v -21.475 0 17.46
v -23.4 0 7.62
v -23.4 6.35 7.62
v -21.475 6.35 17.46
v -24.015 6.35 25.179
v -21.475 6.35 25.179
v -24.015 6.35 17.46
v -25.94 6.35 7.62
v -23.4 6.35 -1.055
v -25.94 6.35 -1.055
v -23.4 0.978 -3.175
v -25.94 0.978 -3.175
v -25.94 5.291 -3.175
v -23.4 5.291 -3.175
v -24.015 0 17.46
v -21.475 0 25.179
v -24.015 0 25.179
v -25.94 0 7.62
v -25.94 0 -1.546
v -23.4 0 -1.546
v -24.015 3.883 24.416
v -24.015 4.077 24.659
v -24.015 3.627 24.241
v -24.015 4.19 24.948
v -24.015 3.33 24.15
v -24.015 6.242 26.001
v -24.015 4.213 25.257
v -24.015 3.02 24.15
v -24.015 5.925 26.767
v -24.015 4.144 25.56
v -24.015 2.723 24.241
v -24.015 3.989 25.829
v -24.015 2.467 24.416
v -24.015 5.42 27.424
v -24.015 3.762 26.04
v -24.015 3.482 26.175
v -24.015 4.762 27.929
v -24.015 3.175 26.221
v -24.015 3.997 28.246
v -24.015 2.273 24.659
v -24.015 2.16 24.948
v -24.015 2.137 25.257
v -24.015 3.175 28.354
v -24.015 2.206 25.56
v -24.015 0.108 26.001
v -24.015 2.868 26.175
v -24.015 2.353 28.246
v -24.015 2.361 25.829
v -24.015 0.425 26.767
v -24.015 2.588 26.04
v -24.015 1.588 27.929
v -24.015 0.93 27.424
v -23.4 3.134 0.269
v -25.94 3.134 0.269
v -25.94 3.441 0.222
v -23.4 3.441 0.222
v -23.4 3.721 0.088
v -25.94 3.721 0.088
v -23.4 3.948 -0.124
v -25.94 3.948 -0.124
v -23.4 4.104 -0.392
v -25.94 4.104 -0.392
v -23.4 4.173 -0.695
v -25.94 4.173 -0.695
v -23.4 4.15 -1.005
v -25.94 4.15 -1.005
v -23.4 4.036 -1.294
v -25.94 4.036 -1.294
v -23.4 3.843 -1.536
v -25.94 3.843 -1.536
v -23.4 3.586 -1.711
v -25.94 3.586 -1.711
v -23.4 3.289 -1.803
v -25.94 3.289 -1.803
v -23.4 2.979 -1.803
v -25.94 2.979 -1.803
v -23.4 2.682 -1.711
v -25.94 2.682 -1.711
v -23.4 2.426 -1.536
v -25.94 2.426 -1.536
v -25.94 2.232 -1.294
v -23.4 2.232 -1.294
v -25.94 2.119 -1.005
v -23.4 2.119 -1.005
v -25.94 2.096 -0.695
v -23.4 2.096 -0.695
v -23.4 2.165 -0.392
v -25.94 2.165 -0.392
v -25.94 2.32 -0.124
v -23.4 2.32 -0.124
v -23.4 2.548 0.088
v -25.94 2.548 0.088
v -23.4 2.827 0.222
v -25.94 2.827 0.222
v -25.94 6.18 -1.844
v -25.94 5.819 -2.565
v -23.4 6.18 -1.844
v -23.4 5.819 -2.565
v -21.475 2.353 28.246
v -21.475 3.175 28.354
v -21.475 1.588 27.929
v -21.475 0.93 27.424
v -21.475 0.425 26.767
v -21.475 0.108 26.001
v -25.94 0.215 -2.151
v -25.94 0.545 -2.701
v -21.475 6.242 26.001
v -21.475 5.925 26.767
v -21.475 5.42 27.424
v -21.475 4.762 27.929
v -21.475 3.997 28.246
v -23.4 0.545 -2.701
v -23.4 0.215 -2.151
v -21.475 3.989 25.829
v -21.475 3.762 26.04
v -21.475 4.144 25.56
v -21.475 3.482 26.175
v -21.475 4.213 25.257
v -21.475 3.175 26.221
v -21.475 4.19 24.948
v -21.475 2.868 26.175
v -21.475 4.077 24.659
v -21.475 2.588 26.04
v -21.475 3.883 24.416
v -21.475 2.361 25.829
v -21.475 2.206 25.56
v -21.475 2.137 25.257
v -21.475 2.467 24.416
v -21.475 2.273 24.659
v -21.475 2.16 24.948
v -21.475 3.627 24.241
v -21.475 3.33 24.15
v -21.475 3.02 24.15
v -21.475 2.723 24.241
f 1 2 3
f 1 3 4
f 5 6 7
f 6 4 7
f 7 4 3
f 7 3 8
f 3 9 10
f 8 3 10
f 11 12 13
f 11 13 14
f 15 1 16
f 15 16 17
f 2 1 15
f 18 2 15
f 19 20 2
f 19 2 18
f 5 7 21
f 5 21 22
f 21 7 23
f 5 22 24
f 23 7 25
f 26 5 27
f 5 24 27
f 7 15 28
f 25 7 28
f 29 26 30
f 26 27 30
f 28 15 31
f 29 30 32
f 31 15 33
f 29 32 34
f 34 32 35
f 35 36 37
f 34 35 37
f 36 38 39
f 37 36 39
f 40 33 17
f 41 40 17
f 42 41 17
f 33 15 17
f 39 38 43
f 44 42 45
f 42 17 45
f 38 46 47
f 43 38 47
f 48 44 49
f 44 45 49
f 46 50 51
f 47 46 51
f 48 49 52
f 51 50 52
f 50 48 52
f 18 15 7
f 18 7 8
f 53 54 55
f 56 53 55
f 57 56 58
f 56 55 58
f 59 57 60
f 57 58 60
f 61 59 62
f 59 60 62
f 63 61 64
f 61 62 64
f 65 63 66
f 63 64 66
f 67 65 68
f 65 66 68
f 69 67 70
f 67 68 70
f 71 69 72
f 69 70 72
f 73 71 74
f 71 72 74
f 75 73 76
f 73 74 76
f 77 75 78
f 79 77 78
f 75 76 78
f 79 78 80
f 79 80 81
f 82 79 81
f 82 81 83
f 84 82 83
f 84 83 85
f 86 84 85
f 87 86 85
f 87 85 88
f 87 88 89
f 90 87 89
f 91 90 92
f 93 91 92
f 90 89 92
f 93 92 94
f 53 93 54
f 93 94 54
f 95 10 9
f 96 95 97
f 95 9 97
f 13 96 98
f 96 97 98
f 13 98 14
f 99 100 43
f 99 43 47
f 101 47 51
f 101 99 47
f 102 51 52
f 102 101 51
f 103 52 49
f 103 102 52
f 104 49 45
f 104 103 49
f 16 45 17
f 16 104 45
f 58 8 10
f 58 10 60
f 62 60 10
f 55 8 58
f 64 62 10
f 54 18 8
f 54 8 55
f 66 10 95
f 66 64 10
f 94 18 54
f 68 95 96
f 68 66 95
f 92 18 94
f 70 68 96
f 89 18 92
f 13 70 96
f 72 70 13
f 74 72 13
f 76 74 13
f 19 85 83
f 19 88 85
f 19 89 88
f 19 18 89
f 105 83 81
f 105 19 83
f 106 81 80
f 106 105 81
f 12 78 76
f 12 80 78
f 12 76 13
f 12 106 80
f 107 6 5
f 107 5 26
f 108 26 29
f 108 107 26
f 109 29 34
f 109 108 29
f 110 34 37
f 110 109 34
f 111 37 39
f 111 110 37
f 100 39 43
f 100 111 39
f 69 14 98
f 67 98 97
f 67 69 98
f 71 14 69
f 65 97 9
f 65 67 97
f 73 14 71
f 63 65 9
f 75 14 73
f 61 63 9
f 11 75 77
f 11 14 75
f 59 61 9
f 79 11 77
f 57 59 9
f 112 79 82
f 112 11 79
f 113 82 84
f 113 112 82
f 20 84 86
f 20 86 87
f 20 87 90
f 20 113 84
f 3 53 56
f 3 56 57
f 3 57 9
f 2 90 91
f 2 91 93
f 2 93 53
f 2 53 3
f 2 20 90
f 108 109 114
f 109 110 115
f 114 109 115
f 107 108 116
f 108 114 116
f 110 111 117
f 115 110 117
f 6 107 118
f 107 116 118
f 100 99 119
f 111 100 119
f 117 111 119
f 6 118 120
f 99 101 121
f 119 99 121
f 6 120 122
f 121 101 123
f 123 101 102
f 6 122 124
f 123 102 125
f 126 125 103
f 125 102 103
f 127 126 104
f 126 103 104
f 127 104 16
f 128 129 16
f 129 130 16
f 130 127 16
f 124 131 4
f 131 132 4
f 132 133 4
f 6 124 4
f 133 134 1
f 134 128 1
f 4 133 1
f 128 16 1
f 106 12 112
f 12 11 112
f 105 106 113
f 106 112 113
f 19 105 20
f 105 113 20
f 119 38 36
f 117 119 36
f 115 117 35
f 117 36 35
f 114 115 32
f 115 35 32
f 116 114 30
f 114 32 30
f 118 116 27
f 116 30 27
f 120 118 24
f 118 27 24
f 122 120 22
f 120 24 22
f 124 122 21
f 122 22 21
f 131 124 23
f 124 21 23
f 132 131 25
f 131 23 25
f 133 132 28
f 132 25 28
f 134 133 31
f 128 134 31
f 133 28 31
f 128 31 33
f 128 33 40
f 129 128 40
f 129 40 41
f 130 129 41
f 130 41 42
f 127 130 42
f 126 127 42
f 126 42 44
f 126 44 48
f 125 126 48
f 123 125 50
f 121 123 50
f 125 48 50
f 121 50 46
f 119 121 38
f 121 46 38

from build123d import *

# Parameters (mm, degrees)
BOSS_EXTRUDE1_DEPTH     = 6.35
CUT_EXTRUDE1_DEPTH      = 30.397829873
CUT_EXTRUDE1_DEPTH_BACK = 3.556
CUT_EXTRUDE2_START      = -2.54
CUT_EXTRUDE2_DEPTH      = 2.54
SKETCH4_3_R             = 1.0414
CUT_EXTRUDE3_DEPTH      = 2.54
SKETCH3_3_R             = 1.0414
CUT_EXTRUDE4_DEPTH      = 2.54


# Read off the part's stored shape, not the designer's step: Cut-Extrude2
with BuildPart() as part:
    # Sketch1 → Boss-Extrude1 (new body)
    with BuildSketch(Plane(origin=(0, 0, 0), x_dir=(1, 0, 0), z_dir=(0, 1, 0))):
        Polygon((-24.015298923, -26.283339213), (-24.015298923, -25.179419289), (-24.015298923, -17.460268456), (-25.940364211, -7.62), (-25.940364211, 3.175), (-23.400364211, 3.175), (-23.400364211, -7.62), (-21.475298923, -17.460268456), (-21.475298923, -25.179419289), (-21.475298923, -28.354419289), (-24.015298923, -28.354419289), align=None)
    extrude(amount=BOSS_EXTRUDE1_DEPTH)

    # Sketch3 → Cut-Extrude1 (cut, two sides: drawn at the far end of the back side and taken through both)
    with BuildSketch(Plane.ZY.offset(25.940364211).offset(-CUT_EXTRUDE1_DEPTH_BACK)):
        with BuildLine():
            Line((68.316456583, 0.312090818), (-0.490666477, 6.35))
            ThreePointArc((-0.490666477, 6.35), (-3.991378408, 2.885541924), (0, 0))
            Line((0, 0), (67.062782235, 16.536619059))
            Line((67.062782235, 16.536619059), (-70.669713894, 5.893986208))
            Line((-70.669713894, 5.893986208), (-69.416039547, -10.330542032))
            Line((-69.416039547, -10.330542032), (68.316456583, 0.312090818))
        make_face()
    extrude(amount=CUT_EXTRUDE1_DEPTH + CUT_EXTRUDE1_DEPTH_BACK, mode=Mode.SUBTRACT)


with BuildPart() as cut_extrude1_kept_piece:
    # of the separate pieces the step leaves, the one the design keeps (cut_extrude1_pieces_kept)
    add(part.part.solids().sort_by_distance((-24.015298923, 0, 17.460268456))[0])

    # Cut-Extrude2 outline → Cut-Extrude2 (cut)
    with BuildSketch(Plane.ZY.offset(24.015298923).offset(CUT_EXTRUDE2_START)):
        with BuildLine():
            Line((28.354419289, 6.35), (25.179419289, 6.35))
            ThreePointArc((25.179419289, 6.35), (27.424483319, 5.42006403), (28.354419289, 3.175))
            Line((28.354419289, 3.175), (28.354419289, 6.35))
        make_face()
        with BuildLine():
            Line((28.354419289, 0), (28.354419289, 3.175))
            ThreePointArc((28.354419289, 3.175), (27.424483319, 0.92993597), (25.179419289, 0))
            Line((25.179419289, 0), (28.354419289, 0))
        make_face()
    extrude(amount=CUT_EXTRUDE2_DEPTH, mode=Mode.SUBTRACT)

    # Sketch4<3> → Cut-Extrude3 (cut)
    with BuildSketch(Plane.ZY.offset(24.015298923)):
        with Locations((25.179419289, 3.175)):
            Circle(SKETCH4_3_R)
    extrude(amount=-CUT_EXTRUDE3_DEPTH, mode=Mode.SUBTRACT)

    # Sketch3<3> → Cut-Extrude4 (cut)
    with BuildSketch(Plane.ZY.offset(25.940364211)):
        with Locations((-0.772853494, 3.134238346)):
            Circle(SKETCH3_3_R)
    extrude(amount=-CUT_EXTRUDE4_DEPTH, mode=Mode.SUBTRACT)


solid = cut_extrude1_kept_piece.part
